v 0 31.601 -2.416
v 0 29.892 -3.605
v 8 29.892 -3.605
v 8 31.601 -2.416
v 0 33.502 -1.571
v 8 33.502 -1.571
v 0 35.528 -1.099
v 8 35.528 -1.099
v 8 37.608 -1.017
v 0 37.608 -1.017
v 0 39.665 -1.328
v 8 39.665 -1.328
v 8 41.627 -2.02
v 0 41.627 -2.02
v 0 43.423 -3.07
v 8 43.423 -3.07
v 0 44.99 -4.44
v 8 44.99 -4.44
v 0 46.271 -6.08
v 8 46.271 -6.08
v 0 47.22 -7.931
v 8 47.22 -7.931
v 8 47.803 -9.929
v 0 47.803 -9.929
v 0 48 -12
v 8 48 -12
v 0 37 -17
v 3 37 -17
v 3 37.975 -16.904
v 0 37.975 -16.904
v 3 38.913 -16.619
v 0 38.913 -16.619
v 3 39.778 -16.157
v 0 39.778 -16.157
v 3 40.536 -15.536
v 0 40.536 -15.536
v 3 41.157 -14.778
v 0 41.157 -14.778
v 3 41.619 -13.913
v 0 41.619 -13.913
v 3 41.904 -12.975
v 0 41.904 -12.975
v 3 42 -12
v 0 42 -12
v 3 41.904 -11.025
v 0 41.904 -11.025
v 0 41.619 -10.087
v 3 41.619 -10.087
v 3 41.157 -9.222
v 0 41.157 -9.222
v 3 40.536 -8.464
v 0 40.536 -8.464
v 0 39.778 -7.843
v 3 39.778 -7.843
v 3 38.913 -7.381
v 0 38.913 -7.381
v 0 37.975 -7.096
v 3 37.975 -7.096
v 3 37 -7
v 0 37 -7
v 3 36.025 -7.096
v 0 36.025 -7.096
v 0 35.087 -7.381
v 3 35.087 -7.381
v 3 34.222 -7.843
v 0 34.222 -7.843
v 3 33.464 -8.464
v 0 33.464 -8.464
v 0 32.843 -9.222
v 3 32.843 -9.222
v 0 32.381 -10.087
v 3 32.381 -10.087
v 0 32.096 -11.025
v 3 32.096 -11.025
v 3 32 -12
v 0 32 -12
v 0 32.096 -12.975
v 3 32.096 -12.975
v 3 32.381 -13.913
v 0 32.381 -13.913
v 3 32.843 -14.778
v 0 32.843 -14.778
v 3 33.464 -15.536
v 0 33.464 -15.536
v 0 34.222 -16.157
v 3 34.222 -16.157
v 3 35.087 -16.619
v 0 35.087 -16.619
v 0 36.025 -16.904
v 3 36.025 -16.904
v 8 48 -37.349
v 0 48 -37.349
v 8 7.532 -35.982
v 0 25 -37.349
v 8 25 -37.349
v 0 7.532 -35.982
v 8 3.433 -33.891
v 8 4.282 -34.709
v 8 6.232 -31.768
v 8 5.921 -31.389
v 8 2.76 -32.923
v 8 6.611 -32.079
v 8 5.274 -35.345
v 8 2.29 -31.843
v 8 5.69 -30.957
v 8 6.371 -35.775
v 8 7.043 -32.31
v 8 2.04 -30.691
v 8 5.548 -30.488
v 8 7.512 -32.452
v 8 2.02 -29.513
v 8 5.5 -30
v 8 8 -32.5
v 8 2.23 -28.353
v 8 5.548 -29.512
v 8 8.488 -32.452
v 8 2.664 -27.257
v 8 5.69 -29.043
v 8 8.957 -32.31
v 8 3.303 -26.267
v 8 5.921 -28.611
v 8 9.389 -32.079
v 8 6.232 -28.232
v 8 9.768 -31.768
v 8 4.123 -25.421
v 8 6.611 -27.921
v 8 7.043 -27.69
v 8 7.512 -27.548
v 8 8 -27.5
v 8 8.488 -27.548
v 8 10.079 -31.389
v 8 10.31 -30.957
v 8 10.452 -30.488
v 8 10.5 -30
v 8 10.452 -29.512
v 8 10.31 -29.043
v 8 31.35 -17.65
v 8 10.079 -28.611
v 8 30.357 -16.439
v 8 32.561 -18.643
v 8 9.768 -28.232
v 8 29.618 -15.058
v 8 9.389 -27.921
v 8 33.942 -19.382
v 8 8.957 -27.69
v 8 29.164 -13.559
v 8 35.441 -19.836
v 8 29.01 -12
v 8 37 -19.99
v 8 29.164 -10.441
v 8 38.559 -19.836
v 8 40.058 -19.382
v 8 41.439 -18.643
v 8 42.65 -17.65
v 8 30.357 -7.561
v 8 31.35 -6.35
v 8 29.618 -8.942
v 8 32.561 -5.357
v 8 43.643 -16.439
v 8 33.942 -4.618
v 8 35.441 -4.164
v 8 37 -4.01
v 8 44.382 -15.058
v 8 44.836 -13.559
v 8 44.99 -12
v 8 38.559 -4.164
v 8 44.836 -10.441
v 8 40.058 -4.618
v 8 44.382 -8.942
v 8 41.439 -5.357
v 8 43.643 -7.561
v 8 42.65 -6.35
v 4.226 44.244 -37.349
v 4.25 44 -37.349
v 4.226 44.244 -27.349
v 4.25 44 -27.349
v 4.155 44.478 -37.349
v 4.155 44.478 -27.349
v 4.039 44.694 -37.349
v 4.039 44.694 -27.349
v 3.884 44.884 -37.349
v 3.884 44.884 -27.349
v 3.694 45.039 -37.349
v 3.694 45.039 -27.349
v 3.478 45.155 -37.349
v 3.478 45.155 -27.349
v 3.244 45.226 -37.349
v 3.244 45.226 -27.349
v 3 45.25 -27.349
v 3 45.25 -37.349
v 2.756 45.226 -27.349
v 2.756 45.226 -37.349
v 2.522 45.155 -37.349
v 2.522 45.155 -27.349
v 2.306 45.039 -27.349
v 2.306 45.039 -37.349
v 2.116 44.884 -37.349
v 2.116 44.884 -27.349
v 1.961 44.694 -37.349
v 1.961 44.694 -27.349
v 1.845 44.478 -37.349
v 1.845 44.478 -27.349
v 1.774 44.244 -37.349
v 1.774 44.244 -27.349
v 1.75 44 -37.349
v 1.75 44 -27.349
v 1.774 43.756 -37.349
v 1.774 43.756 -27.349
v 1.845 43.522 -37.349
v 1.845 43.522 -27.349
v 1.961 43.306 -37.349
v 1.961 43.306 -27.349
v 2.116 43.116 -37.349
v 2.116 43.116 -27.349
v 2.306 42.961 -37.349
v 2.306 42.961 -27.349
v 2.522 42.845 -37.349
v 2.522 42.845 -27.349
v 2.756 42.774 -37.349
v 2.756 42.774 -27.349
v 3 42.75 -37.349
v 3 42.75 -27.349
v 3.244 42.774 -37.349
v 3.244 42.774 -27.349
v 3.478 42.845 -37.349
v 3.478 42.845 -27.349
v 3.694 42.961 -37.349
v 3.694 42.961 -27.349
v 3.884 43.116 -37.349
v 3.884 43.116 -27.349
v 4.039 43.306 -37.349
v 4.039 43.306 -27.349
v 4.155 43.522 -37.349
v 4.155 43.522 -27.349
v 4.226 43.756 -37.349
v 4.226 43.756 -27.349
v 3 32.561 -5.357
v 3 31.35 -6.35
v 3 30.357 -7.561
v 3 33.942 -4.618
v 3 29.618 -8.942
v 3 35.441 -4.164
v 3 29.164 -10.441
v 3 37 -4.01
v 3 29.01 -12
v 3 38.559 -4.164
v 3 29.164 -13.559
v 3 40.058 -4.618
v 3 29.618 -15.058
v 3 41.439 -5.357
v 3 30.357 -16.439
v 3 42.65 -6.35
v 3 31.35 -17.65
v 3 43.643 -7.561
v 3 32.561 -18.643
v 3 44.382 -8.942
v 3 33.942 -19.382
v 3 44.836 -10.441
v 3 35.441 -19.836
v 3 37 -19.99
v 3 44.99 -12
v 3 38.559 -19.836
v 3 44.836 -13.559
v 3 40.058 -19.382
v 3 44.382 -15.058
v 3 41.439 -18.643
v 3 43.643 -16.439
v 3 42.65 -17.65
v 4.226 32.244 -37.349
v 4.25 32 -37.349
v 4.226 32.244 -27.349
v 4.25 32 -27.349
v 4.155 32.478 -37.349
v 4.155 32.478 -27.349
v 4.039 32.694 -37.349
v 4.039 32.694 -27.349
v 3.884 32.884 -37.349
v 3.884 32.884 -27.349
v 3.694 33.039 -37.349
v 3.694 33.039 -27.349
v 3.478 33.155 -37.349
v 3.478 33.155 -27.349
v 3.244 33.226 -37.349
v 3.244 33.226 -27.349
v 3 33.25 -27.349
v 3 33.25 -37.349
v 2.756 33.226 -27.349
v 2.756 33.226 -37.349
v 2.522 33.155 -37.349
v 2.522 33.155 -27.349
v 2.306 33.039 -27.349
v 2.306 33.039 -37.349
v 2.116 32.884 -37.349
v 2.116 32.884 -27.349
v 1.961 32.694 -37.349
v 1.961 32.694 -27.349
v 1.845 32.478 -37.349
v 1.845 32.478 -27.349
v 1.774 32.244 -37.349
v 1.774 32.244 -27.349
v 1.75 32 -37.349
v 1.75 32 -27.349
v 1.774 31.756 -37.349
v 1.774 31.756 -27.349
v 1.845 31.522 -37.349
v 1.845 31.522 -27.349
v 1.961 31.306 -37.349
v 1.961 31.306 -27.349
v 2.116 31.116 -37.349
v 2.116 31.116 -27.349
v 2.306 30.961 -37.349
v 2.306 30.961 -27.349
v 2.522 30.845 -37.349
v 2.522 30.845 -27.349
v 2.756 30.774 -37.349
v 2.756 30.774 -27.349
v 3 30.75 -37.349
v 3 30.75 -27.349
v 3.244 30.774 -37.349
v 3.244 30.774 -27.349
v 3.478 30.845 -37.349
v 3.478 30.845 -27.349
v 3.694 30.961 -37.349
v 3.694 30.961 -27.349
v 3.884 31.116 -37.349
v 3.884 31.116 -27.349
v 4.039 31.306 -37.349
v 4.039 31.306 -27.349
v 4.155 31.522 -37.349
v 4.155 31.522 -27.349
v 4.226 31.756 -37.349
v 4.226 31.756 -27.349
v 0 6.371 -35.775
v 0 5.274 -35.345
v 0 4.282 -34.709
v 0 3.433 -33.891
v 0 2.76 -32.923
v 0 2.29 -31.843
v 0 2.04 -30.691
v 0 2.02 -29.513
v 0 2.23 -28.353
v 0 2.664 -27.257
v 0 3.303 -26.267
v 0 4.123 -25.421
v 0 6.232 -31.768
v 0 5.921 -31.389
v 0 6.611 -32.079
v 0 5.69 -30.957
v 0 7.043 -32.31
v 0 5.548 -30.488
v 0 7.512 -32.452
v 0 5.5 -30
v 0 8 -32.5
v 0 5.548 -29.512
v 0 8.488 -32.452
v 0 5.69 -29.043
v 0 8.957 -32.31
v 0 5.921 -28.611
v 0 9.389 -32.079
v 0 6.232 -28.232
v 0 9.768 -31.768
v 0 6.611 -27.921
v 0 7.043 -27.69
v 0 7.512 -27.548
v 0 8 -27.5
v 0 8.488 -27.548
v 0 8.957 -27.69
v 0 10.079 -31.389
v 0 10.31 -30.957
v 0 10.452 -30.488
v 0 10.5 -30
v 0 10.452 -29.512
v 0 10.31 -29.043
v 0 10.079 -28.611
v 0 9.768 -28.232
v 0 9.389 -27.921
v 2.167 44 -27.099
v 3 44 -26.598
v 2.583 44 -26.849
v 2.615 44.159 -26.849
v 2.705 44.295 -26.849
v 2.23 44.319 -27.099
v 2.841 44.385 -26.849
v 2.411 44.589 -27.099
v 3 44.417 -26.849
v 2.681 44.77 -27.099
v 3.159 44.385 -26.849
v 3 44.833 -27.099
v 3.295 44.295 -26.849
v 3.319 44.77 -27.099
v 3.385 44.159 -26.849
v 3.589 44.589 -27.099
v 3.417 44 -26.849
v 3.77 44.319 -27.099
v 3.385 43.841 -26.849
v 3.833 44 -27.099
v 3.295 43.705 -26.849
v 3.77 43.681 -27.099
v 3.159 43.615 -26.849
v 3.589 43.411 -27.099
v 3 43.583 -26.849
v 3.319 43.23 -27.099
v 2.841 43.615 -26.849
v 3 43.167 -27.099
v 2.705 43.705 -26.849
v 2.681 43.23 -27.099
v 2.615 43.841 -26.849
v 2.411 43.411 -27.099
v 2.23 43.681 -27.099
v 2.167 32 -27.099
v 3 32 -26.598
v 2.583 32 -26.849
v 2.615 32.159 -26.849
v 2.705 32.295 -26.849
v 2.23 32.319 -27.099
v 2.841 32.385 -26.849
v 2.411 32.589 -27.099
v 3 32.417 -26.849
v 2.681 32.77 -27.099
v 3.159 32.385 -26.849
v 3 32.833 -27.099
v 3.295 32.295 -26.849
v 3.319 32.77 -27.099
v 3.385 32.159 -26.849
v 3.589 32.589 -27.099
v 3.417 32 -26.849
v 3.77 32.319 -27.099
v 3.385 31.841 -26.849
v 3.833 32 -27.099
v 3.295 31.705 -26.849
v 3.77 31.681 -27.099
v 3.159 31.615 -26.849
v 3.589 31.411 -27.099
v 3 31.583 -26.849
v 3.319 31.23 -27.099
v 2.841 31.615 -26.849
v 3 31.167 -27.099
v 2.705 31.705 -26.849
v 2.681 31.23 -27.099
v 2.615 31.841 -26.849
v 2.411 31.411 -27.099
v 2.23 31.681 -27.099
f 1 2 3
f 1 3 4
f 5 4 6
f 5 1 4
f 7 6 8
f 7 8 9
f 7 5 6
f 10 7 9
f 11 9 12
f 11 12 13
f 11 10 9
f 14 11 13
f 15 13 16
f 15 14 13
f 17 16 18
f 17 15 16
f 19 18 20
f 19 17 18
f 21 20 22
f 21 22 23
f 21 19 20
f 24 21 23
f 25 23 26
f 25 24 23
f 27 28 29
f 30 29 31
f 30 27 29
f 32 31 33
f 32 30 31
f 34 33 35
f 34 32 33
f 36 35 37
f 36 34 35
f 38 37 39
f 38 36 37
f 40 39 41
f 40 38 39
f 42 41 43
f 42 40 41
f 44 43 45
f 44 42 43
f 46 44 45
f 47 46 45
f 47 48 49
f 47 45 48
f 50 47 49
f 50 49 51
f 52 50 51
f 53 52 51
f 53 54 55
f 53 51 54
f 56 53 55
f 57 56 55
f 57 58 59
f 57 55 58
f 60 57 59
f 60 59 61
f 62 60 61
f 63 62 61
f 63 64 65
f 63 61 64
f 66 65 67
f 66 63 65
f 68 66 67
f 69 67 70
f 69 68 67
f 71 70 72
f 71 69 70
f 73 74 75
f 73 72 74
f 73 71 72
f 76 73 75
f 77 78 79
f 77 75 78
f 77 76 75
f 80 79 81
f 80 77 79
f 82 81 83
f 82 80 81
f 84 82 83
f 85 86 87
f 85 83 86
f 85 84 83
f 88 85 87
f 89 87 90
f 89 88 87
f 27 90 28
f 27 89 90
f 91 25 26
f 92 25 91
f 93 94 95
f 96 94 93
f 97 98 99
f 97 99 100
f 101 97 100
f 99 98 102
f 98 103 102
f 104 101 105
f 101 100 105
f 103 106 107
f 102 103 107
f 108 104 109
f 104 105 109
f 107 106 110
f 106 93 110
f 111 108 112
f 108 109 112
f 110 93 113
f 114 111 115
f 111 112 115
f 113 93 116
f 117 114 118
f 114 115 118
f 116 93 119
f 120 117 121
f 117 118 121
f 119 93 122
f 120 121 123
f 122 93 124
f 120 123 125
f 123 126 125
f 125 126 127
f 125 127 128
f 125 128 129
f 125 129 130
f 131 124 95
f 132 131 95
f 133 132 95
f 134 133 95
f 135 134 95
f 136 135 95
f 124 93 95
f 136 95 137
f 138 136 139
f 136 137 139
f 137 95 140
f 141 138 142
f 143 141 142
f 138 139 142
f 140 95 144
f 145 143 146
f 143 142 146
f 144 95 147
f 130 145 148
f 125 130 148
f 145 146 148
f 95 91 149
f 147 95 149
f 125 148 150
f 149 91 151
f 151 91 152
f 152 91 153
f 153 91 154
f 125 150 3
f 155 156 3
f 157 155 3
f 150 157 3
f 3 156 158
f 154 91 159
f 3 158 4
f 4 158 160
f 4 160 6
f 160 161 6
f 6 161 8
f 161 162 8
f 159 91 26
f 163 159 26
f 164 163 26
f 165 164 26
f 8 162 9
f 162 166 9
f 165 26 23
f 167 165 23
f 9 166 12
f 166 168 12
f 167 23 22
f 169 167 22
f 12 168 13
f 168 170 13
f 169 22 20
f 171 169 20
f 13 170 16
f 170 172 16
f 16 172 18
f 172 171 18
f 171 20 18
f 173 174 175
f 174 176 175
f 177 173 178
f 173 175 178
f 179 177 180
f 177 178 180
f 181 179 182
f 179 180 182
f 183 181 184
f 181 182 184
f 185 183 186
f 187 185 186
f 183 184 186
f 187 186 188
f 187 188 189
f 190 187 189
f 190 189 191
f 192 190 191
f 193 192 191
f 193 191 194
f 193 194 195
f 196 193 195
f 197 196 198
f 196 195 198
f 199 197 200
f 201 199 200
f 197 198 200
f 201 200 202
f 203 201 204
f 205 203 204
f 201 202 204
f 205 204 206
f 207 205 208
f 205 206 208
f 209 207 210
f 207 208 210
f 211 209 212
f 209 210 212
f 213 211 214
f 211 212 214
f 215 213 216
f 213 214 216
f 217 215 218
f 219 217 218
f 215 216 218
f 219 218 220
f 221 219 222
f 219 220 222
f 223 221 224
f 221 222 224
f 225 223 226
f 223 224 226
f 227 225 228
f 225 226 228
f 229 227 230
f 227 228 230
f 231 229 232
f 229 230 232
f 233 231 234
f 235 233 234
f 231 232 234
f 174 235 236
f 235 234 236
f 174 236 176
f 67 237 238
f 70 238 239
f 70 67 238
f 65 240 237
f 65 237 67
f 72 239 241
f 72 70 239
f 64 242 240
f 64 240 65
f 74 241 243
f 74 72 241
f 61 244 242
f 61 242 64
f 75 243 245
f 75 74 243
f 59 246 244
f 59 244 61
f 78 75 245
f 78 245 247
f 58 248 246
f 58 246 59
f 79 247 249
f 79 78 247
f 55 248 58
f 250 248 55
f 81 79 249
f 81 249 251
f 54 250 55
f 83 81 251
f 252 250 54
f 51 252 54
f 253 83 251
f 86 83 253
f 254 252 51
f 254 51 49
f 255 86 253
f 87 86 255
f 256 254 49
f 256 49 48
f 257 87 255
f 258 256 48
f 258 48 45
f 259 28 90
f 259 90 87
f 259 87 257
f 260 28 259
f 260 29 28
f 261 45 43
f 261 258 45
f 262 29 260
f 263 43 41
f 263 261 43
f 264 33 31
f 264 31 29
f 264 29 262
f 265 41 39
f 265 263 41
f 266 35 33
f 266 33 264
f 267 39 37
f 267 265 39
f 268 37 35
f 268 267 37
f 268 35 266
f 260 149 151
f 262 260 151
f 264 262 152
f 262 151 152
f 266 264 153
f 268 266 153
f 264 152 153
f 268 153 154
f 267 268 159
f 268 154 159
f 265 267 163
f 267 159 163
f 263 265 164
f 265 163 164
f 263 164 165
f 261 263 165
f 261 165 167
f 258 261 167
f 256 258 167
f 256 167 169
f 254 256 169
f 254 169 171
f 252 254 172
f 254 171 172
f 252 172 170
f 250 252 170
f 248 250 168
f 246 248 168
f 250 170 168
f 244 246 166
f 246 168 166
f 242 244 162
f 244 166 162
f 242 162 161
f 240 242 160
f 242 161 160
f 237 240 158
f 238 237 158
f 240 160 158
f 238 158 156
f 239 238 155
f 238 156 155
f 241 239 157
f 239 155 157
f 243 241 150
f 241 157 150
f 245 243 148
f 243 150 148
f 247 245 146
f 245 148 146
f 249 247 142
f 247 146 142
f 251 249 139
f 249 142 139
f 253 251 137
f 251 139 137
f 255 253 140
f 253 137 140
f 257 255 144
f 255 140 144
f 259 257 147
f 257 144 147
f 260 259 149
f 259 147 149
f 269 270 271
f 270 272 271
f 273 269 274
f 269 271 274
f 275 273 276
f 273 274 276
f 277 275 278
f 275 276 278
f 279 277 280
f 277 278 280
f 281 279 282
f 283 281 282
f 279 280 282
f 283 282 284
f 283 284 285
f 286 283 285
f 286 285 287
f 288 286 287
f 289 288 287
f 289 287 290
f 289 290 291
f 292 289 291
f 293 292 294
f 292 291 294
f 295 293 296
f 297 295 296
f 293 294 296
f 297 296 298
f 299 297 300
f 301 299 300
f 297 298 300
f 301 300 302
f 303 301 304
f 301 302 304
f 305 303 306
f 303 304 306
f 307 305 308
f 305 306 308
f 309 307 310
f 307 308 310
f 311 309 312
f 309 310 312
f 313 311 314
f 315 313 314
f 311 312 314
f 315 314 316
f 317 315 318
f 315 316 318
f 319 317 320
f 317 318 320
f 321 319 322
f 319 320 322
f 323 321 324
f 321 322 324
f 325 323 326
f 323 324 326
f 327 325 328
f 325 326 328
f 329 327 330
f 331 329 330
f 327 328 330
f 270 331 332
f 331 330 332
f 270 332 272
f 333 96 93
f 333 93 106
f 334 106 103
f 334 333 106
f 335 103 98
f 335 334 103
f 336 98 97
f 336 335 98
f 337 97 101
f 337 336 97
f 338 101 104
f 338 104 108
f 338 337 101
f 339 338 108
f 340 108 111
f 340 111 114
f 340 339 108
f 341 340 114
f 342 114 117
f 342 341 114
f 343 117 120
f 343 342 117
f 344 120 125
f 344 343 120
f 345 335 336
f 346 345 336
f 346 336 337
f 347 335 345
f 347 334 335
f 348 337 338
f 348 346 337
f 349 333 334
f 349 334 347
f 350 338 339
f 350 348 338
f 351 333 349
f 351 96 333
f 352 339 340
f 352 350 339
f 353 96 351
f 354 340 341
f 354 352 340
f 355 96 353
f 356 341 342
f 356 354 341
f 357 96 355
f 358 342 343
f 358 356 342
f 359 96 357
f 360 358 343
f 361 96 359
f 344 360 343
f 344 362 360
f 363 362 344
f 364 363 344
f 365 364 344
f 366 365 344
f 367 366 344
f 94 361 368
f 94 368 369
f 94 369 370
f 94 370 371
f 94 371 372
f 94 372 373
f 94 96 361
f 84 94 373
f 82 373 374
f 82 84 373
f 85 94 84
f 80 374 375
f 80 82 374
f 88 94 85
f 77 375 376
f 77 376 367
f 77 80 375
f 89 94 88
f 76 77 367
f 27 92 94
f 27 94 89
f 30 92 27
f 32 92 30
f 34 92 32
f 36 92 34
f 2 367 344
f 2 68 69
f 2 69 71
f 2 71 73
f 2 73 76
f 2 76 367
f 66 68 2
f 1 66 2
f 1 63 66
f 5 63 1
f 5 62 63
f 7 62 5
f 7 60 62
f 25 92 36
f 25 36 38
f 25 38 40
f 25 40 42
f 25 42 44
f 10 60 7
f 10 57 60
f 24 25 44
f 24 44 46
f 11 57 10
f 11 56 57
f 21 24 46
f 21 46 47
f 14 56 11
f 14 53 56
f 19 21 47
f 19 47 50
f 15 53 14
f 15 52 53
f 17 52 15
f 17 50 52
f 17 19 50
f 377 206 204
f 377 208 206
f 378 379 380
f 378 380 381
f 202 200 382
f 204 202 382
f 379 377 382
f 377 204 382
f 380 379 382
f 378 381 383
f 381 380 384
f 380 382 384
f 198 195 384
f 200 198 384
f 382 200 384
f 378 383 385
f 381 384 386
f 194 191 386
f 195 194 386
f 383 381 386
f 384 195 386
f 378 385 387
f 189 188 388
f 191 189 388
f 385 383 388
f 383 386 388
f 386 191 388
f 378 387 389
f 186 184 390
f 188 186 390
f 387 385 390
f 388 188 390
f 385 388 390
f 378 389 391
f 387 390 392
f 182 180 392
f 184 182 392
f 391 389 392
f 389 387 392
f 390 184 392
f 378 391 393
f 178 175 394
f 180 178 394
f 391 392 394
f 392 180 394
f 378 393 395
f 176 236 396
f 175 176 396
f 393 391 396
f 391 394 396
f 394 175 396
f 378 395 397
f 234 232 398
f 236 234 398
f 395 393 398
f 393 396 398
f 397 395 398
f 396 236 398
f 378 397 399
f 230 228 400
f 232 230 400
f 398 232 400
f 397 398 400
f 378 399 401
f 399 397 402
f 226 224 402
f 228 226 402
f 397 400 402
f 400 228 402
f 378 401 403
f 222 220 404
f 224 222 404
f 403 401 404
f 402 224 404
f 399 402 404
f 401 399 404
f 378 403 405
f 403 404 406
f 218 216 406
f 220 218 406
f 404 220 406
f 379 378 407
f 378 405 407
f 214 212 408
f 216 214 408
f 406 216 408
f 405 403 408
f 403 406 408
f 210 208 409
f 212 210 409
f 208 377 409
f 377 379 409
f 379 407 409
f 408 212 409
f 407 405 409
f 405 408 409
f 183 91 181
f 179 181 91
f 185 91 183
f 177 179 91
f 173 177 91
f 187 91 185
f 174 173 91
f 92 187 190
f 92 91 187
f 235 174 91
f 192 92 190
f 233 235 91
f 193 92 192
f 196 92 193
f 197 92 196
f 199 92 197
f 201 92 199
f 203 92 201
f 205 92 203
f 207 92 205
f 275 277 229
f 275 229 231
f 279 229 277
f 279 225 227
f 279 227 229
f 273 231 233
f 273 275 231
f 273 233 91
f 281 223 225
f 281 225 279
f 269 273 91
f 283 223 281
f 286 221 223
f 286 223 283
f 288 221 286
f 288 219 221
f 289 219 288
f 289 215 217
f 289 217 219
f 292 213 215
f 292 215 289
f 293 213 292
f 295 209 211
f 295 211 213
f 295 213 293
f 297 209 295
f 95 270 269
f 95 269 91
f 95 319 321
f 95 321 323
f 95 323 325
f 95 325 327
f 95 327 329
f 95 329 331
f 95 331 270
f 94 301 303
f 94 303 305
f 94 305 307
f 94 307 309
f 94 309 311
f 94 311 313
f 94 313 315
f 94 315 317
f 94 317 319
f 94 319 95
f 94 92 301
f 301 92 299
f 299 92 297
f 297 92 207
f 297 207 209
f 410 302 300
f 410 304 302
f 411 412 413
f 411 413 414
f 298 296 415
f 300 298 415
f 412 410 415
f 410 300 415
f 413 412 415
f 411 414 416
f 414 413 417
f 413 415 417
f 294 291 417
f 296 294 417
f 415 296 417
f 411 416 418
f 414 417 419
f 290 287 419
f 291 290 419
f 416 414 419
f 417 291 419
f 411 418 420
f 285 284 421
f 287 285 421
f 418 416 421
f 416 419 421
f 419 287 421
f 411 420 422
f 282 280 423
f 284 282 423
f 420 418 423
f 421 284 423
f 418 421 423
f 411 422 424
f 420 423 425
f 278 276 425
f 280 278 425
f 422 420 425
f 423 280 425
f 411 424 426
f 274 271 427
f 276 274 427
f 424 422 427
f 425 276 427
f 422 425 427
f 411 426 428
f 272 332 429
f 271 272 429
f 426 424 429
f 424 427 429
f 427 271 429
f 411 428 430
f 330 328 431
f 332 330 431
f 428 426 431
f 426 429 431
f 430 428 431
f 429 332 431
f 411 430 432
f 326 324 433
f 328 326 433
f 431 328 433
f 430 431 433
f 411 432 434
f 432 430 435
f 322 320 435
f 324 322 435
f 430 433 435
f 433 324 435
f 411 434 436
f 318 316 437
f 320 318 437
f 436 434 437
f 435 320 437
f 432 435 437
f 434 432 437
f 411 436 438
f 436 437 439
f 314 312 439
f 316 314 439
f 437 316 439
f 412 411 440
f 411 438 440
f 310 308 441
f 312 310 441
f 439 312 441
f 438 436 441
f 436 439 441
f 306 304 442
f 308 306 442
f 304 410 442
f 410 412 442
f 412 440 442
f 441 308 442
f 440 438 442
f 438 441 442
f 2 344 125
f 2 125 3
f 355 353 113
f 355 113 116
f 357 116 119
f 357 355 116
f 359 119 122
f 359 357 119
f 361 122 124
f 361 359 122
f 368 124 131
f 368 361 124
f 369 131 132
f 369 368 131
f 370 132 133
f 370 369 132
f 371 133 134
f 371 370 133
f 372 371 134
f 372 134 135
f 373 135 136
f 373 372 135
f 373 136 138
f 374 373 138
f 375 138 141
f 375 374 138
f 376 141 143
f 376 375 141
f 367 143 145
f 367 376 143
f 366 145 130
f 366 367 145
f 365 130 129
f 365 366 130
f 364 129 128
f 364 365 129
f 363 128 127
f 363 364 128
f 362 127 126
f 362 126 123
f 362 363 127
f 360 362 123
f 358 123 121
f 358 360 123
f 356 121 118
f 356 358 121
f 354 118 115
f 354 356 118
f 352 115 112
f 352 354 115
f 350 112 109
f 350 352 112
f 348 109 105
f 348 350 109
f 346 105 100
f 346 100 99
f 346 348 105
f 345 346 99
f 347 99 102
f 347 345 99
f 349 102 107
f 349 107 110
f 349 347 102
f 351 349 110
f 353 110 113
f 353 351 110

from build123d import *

# Parameters (mm, degrees)
SKETCH27_R                  = 5
SKETCH27_R_2                = 2.5
BOSS_EXTRUDE1_DEPTH         = 8
TAP_DRILL_FOR_M3_TAP1_D     = 2.5
TAP_DRILL_FOR_M3_TAP1_DEPTH = 10
TAP_DRILL_FOR_M3_TAP1_TIP   = 0.751075774
SKETCH33_R                  = 7.99
CUT_EXTRUDE2_DEPTH          = 5


with BuildPart() as part:
    # Sketch27 → Boss-Extrude1 (new body)
    with BuildSketch(Plane(origin=(0, 0, 0), x_dir=(0, 0, -1), z_dir=(1, 0, 0))):
        with BuildLine():
            Line((12, 48), (37.349351573, 48))
            Line((37.349351573, 48), (37.349351573, 25))
            Line((37.349351573, 25), (35.981694484, 7.531672014))
            ThreePointArc((35.981694484, 7.531672014), (31.842856312, 2.290019211), (25.420672816, 4.12317623))
            Line((25.420672816, 4.12317623), (3.604566829, 29.892489756))
            ThreePointArc((3.604566829, 29.892489756), (2.020455604, 41.626952956), (12, 48))
        make_face()
        with Locations((12, 37)):
            Circle(SKETCH27_R, mode=Mode.SUBTRACT)
        with Locations((30, 8)):
            Circle(SKETCH27_R_2, mode=Mode.SUBTRACT)
    extrude(amount=BOSS_EXTRUDE1_DEPTH)

    # Tap Drill for M3 Tap1
    with Locations(Plane(origin=(0, 0, -37.349351573), x_dir=(-1, 0, 0), z_dir=(0, 0, -1))):
        with Locations((-3, 32), (-3, 44)):
            Hole(TAP_DRILL_FOR_M3_TAP1_D / 2, depth=TAP_DRILL_FOR_M3_TAP1_DEPTH)
            with Locations((0, 0, -(TAP_DRILL_FOR_M3_TAP1_DEPTH + TAP_DRILL_FOR_M3_TAP1_TIP / 2))):  # 118° drill point
                Cone(0, TAP_DRILL_FOR_M3_TAP1_D / 2, TAP_DRILL_FOR_M3_TAP1_TIP, mode=Mode.SUBTRACT)

    # Sketch33 → Cut-Extrude2 (cut)
    with BuildSketch(Plane(origin=(8, 0, 0), x_dir=(0, 0, -1), z_dir=(1, 0, 0))):
        with Locations((12, 37)):
            Circle(SKETCH33_R)
    extrude(amount=-CUT_EXTRUDE2_DEPTH, mode=Mode.SUBTRACT)


solid = part.part
